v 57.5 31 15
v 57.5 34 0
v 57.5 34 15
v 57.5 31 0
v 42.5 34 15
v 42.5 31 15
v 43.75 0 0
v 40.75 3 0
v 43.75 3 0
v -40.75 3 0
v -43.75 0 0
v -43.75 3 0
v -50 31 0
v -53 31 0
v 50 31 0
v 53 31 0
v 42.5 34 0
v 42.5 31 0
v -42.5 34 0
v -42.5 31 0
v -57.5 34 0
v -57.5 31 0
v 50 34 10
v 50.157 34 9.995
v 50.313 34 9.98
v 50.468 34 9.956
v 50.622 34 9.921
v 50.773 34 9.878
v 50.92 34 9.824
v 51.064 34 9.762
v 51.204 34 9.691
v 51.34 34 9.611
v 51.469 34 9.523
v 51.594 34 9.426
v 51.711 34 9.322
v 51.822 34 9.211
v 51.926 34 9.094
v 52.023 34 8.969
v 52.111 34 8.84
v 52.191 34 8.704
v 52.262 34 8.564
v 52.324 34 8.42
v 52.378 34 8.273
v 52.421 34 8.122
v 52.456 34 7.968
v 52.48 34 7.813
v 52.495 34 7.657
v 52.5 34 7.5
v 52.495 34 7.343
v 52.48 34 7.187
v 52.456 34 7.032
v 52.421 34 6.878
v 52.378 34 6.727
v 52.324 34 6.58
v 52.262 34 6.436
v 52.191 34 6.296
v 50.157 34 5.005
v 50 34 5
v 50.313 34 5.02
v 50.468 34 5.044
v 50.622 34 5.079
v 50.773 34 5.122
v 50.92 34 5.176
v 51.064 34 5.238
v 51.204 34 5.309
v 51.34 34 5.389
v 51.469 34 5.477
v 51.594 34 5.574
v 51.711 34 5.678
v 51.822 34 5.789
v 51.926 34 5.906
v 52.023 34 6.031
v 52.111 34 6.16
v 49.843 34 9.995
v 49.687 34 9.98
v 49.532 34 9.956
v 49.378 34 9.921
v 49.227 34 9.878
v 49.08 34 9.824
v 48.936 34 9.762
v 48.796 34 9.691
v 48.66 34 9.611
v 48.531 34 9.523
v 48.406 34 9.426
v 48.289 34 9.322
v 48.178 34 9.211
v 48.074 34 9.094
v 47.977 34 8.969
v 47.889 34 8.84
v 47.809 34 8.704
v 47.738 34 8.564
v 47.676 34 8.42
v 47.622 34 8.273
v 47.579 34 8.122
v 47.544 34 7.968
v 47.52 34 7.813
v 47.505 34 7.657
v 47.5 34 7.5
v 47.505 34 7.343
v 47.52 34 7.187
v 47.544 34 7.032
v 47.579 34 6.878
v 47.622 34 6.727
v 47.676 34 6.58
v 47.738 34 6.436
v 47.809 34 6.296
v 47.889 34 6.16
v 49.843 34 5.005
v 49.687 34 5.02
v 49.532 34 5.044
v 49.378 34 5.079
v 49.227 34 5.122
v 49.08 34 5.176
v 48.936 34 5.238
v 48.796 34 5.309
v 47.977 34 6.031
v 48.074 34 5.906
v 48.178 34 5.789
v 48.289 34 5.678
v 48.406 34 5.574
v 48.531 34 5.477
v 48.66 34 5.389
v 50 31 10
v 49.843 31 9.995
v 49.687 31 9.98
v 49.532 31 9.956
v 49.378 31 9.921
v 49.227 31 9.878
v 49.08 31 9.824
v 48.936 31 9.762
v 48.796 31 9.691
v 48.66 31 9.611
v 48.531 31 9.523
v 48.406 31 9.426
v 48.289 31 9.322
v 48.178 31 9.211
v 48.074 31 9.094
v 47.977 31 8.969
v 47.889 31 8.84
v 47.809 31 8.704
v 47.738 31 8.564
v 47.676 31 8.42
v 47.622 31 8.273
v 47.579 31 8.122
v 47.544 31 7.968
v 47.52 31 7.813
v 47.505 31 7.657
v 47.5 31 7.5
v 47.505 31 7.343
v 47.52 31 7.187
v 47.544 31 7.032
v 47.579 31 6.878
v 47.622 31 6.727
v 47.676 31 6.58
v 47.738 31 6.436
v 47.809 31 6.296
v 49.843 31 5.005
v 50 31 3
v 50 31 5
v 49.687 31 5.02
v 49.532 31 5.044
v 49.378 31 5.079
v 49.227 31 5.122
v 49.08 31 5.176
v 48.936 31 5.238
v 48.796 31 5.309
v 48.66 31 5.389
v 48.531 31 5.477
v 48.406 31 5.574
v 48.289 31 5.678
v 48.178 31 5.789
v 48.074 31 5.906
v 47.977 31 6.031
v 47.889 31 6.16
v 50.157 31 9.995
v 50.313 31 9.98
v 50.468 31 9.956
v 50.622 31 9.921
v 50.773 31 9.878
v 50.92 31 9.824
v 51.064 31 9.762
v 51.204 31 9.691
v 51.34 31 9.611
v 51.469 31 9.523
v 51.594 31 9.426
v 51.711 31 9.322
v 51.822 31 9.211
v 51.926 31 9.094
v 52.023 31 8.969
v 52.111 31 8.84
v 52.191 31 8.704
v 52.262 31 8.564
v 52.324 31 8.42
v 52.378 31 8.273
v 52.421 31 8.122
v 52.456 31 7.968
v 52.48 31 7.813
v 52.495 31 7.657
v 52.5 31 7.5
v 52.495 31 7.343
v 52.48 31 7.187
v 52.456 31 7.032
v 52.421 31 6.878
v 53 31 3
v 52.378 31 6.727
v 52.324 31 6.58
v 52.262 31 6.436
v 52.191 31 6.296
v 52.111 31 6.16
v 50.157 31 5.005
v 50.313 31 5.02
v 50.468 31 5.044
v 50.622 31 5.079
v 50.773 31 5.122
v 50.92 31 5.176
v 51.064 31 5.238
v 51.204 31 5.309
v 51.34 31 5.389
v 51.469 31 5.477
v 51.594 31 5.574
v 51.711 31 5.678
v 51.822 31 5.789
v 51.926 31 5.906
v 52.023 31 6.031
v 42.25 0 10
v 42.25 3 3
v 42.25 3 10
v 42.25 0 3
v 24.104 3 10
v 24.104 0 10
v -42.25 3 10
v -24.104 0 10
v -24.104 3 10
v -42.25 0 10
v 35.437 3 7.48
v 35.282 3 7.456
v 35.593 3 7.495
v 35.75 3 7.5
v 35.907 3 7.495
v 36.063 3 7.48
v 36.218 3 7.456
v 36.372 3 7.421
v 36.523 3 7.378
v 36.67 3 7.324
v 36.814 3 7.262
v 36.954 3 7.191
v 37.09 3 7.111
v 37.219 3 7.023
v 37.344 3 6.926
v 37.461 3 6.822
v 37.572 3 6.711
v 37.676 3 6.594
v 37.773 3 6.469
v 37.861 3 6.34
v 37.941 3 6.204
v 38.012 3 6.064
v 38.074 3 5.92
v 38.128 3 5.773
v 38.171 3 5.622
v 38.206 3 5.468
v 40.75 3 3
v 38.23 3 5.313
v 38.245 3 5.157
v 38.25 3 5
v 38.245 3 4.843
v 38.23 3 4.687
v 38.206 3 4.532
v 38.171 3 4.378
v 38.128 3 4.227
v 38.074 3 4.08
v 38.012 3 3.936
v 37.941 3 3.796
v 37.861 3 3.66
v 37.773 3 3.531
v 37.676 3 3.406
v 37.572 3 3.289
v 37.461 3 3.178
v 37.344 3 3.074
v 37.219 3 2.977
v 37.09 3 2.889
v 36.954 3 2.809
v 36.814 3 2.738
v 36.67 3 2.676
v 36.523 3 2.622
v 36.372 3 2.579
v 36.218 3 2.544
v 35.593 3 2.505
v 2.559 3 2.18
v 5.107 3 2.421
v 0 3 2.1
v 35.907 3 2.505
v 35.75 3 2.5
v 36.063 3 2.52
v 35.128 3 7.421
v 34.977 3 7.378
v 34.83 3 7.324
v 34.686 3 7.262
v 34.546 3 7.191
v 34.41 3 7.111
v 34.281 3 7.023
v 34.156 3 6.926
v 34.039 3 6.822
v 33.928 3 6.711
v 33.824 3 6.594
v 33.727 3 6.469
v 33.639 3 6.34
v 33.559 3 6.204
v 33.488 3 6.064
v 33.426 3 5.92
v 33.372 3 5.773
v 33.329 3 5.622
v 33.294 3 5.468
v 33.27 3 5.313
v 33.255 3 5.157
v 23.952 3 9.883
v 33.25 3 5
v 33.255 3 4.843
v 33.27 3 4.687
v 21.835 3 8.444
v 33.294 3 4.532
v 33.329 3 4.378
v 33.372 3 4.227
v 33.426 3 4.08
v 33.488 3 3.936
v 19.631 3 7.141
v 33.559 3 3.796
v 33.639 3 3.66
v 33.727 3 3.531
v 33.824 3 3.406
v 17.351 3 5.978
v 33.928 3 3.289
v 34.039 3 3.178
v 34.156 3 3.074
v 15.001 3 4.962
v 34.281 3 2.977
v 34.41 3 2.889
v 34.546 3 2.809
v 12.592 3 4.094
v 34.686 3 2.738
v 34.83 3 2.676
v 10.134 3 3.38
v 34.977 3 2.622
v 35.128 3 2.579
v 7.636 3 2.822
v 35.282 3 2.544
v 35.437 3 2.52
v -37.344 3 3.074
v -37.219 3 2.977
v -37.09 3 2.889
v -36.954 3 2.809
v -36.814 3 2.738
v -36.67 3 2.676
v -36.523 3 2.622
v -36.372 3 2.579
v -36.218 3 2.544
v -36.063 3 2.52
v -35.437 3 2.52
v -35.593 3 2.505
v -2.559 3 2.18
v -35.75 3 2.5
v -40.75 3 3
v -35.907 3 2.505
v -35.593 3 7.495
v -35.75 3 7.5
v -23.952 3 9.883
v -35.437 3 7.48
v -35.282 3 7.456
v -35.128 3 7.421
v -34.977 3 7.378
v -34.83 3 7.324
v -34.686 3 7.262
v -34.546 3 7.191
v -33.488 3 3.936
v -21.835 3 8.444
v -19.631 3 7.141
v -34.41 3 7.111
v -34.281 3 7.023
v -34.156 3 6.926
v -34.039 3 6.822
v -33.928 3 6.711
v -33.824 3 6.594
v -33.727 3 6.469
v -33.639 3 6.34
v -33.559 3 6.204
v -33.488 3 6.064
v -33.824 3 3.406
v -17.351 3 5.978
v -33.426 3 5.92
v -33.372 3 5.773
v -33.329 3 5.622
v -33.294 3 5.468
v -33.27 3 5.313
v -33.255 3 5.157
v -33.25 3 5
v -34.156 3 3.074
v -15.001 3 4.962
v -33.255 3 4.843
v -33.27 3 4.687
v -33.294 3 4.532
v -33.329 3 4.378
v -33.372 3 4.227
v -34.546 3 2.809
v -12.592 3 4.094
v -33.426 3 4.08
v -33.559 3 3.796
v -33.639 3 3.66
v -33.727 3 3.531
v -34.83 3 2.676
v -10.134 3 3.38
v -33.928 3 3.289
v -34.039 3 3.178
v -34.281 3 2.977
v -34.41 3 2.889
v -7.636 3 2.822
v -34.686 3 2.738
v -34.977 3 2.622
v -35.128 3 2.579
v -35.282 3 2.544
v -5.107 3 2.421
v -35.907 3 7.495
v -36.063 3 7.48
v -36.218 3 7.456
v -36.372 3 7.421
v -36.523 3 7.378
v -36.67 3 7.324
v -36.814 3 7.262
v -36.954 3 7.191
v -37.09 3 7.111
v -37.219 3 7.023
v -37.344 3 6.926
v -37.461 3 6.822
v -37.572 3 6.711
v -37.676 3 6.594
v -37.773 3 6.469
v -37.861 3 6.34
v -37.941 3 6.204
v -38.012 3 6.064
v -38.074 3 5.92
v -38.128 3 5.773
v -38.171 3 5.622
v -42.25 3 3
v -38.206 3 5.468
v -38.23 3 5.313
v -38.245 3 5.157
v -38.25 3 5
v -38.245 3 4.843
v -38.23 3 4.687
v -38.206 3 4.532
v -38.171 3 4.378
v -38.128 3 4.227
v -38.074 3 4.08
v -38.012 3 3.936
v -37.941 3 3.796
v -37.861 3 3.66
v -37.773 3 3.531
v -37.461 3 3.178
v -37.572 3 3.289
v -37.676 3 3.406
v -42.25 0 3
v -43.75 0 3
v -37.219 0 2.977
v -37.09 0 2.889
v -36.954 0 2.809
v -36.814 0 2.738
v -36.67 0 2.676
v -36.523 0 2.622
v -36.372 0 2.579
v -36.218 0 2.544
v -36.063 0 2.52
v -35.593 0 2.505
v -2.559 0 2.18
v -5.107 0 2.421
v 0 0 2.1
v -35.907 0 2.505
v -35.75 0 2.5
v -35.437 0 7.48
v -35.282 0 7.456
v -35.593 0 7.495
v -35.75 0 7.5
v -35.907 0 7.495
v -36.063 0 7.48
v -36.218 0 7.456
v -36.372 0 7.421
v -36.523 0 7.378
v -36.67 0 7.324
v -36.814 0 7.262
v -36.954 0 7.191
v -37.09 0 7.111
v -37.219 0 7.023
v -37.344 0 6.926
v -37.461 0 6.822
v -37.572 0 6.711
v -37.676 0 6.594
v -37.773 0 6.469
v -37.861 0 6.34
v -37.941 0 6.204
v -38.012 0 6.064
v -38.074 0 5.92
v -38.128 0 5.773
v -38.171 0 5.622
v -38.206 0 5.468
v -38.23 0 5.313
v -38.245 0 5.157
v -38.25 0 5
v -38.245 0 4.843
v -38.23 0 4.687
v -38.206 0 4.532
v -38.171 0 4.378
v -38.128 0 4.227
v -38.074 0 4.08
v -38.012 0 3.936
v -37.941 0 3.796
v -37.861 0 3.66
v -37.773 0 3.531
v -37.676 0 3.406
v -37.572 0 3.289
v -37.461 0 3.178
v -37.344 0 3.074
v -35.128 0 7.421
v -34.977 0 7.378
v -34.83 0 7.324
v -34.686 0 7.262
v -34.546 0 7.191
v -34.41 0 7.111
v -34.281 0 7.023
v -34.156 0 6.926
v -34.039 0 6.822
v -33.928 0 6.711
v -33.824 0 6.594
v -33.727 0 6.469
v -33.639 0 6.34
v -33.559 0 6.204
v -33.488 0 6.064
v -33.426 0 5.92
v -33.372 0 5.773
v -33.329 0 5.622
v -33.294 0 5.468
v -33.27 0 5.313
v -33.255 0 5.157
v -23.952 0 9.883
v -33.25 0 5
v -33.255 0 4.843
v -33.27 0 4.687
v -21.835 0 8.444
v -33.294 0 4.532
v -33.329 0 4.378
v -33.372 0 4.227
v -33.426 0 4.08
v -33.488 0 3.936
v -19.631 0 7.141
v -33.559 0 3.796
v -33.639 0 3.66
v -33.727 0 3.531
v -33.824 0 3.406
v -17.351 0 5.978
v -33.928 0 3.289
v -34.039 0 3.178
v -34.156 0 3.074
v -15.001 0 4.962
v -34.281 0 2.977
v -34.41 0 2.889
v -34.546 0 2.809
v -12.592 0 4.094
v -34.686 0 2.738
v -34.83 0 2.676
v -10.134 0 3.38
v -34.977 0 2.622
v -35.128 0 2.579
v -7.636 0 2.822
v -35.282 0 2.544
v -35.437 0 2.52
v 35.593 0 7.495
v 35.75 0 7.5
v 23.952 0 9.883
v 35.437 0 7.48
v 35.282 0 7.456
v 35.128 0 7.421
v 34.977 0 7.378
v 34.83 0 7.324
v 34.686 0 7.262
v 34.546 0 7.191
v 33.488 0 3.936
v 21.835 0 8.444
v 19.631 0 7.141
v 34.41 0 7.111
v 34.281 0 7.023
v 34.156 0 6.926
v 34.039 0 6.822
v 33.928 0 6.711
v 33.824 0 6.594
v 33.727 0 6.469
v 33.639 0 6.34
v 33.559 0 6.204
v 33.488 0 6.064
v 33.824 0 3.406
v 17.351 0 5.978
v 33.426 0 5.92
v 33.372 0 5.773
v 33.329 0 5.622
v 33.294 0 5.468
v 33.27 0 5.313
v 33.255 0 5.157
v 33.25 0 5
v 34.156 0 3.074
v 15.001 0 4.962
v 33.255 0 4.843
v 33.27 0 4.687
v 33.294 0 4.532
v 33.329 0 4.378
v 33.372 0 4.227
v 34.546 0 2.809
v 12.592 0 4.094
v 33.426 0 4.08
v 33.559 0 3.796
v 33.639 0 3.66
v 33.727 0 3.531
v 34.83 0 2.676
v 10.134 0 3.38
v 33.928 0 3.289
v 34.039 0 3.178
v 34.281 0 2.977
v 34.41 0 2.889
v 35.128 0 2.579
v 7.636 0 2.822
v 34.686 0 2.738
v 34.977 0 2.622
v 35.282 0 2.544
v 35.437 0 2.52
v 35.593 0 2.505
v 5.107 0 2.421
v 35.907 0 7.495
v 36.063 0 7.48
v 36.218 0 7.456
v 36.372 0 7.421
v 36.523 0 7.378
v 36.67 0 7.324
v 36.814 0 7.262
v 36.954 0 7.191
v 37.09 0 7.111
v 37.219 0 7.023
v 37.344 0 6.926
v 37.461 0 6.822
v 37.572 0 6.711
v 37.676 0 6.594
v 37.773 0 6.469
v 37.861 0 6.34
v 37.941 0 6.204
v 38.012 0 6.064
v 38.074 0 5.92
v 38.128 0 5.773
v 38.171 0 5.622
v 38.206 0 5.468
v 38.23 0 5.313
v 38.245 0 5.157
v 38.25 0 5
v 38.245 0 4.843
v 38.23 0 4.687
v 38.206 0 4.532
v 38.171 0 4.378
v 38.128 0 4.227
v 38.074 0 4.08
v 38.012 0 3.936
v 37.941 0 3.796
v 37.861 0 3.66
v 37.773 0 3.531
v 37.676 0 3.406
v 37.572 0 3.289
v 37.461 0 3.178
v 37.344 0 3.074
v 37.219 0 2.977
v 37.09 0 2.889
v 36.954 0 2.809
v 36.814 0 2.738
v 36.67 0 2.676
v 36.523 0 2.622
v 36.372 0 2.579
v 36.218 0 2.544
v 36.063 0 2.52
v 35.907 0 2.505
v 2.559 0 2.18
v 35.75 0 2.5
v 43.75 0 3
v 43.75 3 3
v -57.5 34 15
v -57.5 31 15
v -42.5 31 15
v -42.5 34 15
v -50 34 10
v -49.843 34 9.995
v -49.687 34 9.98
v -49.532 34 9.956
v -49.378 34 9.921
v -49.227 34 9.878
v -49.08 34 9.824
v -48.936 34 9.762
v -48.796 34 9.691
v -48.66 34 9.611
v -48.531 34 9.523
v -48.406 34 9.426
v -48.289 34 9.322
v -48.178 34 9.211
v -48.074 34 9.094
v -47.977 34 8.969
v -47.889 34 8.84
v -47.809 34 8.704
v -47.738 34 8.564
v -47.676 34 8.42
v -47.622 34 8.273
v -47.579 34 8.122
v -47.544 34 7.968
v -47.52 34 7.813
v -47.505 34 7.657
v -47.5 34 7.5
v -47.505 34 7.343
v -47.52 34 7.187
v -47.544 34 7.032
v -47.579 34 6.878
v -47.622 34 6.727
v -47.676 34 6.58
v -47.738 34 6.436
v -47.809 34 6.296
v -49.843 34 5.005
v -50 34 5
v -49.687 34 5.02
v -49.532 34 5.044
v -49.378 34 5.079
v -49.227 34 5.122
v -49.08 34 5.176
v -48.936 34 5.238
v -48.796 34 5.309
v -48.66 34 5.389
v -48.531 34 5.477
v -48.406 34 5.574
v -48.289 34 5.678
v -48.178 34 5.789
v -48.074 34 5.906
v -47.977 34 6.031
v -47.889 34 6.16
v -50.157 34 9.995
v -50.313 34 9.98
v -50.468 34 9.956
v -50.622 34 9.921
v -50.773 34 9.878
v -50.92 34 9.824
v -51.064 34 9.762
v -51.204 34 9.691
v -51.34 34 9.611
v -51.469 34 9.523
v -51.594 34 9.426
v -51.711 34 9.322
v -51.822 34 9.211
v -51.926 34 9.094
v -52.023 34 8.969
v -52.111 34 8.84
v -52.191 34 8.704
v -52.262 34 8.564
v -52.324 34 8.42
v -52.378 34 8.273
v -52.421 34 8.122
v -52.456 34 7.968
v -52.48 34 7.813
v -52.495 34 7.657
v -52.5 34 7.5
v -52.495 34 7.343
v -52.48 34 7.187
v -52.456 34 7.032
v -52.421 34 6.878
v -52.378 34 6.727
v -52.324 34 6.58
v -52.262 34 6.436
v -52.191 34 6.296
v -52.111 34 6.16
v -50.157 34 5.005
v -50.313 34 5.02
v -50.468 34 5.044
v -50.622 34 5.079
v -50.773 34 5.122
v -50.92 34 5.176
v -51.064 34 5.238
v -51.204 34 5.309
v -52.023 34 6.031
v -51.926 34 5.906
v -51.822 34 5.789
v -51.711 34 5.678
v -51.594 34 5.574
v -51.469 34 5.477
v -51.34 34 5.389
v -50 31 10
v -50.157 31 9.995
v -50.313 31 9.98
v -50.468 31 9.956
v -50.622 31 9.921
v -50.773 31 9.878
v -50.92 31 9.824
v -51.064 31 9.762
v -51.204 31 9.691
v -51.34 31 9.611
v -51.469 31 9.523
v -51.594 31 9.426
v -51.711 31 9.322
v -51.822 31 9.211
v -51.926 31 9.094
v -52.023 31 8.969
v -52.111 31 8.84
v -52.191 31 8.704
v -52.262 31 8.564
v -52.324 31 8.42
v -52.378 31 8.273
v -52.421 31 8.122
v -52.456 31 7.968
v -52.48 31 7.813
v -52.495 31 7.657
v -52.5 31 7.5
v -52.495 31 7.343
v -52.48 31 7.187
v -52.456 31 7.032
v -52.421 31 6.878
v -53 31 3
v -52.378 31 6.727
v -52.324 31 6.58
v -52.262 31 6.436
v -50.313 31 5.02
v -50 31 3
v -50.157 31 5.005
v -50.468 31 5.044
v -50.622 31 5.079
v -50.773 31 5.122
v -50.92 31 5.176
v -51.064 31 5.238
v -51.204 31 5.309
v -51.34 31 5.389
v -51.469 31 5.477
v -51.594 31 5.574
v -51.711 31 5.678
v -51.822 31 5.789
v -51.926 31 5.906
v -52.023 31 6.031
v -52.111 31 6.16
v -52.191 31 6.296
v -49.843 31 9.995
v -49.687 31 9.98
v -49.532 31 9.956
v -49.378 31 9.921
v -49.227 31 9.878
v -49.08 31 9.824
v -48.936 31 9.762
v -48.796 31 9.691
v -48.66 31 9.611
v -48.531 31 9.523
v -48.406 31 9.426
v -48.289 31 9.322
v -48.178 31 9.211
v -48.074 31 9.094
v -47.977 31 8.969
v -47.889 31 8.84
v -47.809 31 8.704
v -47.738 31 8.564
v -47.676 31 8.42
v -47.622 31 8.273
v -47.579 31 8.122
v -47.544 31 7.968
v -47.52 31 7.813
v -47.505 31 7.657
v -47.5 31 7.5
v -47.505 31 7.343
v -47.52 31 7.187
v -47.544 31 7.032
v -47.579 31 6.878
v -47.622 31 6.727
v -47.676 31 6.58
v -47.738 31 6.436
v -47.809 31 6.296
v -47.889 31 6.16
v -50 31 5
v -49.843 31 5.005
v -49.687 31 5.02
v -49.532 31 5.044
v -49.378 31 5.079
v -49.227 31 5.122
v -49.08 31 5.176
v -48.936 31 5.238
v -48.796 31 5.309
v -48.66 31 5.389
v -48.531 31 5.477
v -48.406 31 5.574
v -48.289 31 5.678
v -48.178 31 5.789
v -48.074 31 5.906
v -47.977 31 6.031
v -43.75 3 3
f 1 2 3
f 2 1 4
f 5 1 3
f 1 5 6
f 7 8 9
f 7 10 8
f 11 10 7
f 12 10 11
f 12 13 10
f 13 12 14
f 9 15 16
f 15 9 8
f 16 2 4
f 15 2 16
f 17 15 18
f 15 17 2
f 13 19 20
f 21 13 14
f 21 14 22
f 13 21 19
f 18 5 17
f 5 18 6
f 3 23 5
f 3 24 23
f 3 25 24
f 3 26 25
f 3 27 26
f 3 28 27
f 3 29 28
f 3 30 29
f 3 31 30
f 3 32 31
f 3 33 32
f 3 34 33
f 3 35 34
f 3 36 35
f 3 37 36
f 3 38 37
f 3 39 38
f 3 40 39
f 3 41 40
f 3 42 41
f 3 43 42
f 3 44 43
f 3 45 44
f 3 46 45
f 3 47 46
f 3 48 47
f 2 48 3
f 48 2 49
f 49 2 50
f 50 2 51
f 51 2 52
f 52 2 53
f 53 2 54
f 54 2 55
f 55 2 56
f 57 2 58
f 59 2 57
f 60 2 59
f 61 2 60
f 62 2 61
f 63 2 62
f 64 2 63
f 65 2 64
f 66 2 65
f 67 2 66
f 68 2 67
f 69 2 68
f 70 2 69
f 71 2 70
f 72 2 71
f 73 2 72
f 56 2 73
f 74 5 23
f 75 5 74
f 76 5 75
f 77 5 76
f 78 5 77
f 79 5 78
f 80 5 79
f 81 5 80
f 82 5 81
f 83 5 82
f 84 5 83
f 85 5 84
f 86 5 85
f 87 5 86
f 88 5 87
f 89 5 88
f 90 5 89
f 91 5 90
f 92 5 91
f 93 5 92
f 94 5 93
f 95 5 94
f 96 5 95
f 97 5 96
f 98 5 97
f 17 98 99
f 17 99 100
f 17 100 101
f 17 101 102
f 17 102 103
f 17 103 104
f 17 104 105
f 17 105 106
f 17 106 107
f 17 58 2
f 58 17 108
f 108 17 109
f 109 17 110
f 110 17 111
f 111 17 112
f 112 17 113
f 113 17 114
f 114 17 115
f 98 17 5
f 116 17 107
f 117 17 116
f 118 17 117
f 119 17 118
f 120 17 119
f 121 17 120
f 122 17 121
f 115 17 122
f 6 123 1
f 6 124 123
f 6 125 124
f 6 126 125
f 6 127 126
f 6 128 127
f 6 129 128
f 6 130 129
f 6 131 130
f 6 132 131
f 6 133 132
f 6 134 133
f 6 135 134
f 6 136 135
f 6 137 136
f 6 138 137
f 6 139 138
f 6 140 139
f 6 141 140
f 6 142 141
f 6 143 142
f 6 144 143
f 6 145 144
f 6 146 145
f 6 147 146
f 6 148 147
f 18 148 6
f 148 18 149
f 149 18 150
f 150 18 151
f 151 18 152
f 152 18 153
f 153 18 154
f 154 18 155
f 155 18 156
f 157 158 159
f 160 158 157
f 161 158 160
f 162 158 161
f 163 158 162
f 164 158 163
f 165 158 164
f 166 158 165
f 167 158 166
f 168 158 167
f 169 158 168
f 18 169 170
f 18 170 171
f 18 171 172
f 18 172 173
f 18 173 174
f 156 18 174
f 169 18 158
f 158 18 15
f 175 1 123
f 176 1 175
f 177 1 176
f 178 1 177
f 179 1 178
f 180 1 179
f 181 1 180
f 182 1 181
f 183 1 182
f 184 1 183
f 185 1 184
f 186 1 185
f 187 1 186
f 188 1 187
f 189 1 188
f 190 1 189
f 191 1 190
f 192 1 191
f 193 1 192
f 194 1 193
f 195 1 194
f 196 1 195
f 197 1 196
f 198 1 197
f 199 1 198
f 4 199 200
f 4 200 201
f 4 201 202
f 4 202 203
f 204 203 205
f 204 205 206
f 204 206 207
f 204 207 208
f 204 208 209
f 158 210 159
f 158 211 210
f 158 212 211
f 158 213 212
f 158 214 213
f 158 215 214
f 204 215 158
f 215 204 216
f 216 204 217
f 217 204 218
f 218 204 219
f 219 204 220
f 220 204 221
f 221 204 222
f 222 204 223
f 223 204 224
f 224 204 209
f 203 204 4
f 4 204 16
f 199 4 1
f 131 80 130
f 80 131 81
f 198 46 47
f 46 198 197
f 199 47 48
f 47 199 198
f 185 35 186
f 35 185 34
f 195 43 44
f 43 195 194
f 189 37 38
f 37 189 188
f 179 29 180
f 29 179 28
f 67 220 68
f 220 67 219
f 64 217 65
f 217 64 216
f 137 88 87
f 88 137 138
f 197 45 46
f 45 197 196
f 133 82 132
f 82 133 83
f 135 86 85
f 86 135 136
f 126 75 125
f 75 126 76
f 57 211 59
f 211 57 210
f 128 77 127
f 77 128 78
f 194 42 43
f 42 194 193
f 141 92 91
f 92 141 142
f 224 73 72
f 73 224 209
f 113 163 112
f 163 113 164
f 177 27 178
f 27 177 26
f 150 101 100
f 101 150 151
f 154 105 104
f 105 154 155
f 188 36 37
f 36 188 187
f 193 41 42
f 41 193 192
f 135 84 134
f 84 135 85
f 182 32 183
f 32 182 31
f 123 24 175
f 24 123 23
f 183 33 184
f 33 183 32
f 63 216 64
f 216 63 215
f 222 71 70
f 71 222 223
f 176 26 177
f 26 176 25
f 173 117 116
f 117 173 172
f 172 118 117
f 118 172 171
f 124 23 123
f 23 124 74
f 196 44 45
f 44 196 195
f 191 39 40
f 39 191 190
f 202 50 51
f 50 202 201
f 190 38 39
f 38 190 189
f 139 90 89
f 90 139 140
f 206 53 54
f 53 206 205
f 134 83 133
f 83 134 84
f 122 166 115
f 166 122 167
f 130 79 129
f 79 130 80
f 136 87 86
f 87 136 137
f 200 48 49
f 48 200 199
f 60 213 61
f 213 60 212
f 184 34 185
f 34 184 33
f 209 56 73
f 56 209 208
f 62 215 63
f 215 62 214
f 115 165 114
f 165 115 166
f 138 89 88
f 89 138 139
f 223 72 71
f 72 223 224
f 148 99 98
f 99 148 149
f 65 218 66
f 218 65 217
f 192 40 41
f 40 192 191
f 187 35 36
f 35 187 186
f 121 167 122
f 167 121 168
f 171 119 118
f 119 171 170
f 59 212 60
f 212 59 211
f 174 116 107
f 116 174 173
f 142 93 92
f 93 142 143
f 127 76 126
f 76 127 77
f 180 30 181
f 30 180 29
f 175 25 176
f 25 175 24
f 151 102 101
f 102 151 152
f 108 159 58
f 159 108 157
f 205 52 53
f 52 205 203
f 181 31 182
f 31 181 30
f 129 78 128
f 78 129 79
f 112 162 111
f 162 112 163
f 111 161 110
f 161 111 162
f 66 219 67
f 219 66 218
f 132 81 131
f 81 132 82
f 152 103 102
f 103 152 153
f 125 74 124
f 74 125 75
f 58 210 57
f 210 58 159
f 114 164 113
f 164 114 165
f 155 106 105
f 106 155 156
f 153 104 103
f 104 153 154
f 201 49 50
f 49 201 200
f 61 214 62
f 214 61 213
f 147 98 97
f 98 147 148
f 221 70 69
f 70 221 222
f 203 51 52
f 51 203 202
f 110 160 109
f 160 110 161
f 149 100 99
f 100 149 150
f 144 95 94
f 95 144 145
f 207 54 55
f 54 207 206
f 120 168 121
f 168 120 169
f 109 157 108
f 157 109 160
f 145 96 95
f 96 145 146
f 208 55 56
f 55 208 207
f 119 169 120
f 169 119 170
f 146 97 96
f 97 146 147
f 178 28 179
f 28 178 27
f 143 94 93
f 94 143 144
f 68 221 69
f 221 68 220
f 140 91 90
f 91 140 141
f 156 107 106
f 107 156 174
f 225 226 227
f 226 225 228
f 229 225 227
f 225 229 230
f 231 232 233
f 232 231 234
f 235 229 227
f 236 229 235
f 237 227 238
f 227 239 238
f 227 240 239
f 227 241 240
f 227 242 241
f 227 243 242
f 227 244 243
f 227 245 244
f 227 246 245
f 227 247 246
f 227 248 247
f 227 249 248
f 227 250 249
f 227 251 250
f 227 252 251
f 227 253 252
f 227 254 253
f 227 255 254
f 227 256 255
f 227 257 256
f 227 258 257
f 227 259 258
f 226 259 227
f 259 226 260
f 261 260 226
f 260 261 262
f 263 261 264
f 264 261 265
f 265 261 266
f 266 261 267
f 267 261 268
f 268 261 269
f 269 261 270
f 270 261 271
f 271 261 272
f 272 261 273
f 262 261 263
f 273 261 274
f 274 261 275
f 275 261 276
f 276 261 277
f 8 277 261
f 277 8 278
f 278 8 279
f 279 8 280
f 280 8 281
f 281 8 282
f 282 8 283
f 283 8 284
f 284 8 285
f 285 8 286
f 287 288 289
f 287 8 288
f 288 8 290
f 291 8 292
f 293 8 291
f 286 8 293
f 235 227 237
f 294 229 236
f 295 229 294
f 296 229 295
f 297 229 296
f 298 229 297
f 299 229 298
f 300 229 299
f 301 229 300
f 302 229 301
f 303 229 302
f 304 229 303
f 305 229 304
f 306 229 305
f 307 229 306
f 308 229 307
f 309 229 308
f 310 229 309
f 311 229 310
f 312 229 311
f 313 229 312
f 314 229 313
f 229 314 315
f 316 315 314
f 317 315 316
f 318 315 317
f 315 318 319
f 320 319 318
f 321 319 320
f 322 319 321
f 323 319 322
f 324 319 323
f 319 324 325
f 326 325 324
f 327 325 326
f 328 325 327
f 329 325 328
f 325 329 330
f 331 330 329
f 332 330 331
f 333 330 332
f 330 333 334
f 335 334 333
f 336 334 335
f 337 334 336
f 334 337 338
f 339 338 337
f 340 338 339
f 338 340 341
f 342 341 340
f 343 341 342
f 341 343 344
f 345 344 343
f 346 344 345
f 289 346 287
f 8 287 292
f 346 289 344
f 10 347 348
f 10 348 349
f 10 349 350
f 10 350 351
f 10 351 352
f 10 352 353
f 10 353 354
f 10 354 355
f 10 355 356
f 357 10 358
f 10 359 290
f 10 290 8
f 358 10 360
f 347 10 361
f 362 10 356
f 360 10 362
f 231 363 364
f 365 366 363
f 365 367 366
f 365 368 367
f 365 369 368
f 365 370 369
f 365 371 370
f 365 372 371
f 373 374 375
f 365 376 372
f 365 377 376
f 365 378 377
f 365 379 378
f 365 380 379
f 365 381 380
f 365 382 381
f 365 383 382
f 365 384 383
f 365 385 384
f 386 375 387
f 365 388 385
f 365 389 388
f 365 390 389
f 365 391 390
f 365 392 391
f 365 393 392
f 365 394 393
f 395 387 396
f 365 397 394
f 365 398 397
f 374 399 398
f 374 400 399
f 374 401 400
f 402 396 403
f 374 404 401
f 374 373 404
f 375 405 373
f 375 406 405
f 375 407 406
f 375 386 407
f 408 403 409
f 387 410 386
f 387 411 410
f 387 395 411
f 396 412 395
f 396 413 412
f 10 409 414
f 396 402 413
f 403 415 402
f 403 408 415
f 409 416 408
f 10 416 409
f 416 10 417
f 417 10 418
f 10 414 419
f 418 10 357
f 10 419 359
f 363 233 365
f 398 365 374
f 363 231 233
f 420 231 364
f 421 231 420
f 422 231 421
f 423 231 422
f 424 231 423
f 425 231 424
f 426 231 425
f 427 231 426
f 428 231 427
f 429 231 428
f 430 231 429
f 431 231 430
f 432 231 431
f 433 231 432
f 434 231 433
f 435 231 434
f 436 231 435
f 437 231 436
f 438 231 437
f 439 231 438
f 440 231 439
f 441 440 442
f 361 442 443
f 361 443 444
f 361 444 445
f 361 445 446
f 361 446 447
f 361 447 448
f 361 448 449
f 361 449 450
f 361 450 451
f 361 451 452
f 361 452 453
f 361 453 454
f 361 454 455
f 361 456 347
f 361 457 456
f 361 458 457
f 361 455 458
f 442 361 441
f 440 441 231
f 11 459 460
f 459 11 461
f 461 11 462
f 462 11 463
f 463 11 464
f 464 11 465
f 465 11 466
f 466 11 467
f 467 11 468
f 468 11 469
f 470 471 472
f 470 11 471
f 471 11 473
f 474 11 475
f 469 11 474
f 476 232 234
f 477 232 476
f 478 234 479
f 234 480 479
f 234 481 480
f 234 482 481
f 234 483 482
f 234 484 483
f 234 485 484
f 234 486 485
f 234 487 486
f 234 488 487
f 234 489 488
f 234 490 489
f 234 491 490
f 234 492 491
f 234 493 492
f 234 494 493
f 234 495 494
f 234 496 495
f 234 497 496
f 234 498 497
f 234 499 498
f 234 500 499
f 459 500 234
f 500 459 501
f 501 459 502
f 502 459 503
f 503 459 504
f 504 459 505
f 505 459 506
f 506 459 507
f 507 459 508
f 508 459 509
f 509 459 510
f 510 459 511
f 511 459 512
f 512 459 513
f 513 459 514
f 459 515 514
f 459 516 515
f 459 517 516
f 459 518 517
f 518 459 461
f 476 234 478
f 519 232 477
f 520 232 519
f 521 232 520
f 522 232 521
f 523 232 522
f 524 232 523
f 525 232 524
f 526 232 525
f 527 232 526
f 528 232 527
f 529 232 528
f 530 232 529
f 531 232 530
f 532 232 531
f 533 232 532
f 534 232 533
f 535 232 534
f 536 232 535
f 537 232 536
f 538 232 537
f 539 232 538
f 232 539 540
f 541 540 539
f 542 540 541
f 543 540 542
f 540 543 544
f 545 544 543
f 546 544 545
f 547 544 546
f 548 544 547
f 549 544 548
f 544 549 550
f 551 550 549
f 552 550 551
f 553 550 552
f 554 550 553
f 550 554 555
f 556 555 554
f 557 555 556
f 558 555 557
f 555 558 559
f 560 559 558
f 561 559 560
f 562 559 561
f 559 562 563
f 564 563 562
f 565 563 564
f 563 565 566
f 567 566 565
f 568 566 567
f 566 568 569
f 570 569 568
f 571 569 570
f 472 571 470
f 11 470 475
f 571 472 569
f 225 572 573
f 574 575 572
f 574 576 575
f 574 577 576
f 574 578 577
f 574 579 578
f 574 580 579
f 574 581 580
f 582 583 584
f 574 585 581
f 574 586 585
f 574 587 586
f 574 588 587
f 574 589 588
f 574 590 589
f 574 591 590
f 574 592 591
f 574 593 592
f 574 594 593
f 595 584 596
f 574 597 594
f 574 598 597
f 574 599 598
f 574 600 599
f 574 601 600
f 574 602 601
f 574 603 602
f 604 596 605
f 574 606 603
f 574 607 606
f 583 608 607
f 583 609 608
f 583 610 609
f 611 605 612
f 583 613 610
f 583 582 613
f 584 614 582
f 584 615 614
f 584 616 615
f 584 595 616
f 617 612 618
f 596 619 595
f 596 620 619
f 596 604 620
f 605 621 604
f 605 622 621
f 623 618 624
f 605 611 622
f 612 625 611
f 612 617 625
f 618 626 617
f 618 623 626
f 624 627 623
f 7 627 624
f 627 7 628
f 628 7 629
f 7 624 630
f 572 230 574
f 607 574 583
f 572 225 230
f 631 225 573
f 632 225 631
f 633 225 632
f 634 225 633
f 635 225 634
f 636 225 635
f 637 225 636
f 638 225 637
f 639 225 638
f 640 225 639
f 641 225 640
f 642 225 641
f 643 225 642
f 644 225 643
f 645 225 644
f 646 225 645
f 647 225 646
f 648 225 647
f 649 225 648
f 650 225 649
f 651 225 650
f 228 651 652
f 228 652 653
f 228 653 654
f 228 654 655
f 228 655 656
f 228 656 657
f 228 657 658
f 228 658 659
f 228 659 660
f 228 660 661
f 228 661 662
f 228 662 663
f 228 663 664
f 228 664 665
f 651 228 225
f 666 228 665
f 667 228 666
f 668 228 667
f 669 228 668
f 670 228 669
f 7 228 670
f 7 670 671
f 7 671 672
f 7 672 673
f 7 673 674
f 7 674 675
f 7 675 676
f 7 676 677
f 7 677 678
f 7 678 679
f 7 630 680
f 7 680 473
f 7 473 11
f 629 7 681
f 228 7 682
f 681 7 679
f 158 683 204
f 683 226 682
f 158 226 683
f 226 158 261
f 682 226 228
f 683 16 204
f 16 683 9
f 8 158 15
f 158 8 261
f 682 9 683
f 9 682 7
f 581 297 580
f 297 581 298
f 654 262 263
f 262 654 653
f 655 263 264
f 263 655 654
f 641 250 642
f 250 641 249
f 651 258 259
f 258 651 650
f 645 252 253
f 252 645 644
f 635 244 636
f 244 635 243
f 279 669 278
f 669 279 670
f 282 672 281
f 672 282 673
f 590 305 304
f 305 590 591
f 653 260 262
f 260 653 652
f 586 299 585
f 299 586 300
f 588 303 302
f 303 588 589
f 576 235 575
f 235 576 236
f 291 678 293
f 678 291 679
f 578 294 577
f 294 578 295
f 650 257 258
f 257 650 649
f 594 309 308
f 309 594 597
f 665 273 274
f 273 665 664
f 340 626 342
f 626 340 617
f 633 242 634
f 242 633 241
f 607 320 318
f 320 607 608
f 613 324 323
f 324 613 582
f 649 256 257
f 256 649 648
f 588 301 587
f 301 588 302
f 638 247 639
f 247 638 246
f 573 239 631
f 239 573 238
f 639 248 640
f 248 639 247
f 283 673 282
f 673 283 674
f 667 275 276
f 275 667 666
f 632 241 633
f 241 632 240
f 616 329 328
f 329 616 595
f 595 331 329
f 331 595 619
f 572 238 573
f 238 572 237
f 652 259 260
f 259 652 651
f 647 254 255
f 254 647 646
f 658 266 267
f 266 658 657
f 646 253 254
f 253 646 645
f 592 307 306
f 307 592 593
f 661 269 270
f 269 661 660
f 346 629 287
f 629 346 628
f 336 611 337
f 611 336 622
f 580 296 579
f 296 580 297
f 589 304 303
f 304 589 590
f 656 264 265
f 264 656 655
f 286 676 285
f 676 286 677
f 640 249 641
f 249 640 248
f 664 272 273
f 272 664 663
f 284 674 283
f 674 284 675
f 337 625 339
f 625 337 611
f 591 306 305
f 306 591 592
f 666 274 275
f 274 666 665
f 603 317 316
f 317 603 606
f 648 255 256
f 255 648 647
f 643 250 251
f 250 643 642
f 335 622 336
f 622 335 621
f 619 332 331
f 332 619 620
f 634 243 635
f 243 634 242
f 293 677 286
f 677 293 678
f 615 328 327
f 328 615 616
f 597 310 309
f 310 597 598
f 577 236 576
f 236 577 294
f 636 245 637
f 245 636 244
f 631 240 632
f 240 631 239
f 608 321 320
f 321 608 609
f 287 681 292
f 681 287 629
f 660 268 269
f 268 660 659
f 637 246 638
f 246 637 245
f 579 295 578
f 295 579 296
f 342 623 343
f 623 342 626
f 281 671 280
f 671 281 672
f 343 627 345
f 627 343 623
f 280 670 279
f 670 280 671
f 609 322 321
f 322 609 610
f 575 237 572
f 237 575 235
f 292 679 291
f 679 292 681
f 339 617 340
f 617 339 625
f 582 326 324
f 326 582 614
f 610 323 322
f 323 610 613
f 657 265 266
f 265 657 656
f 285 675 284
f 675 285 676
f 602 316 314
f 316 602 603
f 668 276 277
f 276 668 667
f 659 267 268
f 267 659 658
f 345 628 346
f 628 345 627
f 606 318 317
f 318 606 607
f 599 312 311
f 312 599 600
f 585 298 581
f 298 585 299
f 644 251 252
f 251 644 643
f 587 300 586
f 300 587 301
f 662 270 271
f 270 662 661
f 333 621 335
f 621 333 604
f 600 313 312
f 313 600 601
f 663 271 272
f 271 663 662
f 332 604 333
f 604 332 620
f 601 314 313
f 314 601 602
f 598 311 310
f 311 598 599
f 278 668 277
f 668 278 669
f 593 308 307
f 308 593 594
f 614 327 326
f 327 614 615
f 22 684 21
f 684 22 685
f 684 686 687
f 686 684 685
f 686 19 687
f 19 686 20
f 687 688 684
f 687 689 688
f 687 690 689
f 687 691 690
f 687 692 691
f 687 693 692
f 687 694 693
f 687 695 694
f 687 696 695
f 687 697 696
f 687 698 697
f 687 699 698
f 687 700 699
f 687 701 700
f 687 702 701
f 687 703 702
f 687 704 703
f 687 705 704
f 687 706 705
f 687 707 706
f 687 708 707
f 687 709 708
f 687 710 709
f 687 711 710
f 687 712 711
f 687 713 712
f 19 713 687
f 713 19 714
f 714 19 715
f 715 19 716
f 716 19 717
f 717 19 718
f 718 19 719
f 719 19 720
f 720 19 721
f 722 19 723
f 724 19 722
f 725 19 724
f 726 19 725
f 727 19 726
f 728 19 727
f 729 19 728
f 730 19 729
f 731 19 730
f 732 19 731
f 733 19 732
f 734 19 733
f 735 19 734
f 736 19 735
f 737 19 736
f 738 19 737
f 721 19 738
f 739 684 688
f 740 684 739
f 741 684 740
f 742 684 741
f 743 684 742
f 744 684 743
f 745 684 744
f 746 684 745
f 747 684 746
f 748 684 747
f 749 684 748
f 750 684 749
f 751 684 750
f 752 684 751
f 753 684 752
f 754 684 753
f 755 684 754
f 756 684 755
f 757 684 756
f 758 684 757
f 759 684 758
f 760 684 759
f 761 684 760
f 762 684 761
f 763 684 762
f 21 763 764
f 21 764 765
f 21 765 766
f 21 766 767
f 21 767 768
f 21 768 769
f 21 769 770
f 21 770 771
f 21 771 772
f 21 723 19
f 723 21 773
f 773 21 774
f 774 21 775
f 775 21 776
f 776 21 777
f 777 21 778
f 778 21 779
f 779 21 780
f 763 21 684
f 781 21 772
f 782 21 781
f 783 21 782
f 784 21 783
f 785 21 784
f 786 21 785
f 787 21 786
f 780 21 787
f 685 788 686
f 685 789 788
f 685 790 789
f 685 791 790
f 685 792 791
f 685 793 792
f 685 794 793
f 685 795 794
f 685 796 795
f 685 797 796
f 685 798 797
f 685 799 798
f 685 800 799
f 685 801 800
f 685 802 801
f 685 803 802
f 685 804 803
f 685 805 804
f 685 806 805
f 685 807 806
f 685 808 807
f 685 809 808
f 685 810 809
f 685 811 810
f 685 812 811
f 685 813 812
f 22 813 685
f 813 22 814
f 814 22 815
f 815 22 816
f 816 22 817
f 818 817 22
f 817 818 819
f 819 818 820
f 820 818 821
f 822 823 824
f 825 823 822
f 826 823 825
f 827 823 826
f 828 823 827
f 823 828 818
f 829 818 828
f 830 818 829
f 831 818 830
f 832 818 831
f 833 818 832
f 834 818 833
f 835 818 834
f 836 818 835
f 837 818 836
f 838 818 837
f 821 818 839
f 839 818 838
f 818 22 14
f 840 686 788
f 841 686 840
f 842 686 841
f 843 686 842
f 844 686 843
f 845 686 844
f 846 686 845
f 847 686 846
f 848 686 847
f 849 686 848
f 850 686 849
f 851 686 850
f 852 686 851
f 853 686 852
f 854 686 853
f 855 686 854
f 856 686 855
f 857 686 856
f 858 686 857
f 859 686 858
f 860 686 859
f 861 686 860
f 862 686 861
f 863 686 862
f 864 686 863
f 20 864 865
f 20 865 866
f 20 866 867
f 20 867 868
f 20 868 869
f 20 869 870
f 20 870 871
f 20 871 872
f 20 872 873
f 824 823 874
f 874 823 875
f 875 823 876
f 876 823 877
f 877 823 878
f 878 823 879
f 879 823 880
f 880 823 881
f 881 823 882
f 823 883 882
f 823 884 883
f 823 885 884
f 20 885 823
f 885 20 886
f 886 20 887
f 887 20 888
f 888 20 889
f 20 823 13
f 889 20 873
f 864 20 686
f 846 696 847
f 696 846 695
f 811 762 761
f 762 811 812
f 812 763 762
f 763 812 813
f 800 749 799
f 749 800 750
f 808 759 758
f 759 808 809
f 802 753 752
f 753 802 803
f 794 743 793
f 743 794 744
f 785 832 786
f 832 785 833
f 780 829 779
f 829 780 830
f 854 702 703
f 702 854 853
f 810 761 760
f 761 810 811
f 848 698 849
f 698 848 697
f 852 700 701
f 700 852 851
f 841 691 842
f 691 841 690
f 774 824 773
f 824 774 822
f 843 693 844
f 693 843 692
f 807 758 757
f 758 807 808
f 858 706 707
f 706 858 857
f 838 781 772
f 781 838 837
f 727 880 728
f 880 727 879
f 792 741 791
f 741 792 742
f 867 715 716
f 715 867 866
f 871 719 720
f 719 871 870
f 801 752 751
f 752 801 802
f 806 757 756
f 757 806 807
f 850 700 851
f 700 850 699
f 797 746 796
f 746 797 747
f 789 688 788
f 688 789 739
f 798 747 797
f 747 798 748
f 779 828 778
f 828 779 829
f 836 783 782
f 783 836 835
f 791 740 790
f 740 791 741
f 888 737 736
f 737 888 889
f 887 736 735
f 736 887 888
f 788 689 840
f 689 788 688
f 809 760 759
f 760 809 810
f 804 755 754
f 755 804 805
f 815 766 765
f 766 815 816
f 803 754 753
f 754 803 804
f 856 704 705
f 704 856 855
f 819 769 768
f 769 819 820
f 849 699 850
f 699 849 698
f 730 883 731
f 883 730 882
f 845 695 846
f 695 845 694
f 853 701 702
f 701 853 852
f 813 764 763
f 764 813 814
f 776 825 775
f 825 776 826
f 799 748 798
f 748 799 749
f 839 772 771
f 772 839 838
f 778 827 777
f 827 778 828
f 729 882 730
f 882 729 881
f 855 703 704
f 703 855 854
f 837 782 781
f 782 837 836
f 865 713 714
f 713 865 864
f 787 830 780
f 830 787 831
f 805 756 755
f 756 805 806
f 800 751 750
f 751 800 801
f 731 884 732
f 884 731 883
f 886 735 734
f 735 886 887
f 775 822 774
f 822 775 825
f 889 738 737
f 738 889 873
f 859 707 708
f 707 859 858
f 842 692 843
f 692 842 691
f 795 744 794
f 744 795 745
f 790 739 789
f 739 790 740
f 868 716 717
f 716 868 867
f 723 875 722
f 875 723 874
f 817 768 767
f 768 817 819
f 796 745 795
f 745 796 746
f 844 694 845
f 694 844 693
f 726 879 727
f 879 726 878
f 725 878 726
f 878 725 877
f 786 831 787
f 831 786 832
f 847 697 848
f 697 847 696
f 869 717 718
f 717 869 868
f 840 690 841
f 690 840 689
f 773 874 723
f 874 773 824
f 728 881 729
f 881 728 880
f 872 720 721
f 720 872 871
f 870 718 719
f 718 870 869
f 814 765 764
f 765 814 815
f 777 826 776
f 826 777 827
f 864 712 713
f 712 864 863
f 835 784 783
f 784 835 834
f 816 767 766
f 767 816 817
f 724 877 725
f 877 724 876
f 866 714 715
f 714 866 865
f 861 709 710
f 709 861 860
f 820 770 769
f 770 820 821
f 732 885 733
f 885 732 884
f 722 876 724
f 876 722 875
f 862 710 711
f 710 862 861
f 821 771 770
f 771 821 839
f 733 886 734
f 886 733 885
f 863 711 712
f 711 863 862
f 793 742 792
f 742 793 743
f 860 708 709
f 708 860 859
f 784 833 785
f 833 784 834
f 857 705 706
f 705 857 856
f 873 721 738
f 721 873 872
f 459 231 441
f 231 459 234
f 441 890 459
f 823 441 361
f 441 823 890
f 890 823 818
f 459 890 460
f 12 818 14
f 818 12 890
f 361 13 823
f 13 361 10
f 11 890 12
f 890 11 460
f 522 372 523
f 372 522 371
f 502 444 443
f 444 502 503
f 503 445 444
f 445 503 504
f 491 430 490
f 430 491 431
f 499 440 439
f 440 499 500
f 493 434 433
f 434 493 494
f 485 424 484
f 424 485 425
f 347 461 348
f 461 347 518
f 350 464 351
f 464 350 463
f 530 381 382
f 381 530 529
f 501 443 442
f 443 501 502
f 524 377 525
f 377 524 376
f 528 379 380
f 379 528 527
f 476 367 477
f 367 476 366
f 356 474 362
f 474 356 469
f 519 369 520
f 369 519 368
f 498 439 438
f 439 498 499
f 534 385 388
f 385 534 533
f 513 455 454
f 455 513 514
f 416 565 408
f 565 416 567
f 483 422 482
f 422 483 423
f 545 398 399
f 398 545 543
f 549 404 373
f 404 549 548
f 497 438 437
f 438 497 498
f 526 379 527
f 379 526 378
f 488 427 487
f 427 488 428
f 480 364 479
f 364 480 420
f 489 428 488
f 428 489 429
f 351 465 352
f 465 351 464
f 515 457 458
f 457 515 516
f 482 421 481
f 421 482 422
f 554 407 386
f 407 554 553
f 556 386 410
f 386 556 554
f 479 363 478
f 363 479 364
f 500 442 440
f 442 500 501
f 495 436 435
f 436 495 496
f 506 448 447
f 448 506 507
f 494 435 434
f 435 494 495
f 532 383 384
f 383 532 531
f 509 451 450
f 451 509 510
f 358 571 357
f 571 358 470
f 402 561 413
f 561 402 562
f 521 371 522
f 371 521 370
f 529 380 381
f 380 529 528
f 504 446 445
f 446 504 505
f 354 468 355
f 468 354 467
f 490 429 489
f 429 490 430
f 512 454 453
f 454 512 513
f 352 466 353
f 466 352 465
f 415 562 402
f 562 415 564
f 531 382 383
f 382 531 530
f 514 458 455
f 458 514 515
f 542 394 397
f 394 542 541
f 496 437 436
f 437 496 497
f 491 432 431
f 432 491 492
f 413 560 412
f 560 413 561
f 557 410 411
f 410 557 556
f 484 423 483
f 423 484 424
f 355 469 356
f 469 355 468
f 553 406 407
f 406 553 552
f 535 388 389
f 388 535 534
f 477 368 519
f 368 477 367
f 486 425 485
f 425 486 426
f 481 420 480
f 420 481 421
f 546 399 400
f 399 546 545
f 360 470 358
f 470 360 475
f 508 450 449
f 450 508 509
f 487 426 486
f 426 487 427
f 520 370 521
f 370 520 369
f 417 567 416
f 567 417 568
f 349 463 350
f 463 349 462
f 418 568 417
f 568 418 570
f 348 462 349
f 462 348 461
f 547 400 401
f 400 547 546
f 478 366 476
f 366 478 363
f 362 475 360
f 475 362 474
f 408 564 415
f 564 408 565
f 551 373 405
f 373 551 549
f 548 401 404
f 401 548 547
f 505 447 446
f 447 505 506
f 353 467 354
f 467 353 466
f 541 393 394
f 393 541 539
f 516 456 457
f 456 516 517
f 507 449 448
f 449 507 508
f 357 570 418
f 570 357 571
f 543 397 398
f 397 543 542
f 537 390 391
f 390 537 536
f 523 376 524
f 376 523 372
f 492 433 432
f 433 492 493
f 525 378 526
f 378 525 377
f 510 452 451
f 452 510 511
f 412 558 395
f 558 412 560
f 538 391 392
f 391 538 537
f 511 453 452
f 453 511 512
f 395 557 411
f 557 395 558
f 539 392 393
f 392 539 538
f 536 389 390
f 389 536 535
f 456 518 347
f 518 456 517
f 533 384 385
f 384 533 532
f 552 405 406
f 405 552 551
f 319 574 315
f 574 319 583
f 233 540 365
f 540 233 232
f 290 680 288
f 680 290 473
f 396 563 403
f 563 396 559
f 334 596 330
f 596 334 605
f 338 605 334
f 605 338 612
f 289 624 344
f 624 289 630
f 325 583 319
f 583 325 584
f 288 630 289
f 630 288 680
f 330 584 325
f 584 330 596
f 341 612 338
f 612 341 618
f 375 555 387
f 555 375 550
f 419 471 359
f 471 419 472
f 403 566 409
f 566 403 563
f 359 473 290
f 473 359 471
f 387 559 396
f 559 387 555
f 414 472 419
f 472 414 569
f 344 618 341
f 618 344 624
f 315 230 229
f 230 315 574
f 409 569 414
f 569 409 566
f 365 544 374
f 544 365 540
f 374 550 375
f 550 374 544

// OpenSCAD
// Thickness of part surfaces.
thickness = 3;
// Distance in mm that fan will be raised by. Any distance in mm greater than 2 x thickness.
height = 34;
// Center-to-center distance in mm between fan mounting holes, used for sizing the fan mount plate. i.e. an 80mm fan should be set to 71.5mm
fan_mounting_hole_seperation = 71.5;
// Center-to-center distance in mm between chassis mounting holes, used for positioning the mounting feet.
mount_hole_seperation = 100;
// Chassis mount screw hole diameter in mm.
mount_screw_hole_diameter = 5;
// Fan mount screw hole diameter in mm.
fan_screw_hole_diameter = 5;

module fan_stand(thickness, height, fan_hole_sep, mount_hole_sep)
{
	// Calculate sizes of parts (some calculations are done below).
	fan_dia = fan_mounting_hole_seperation + 2*fan_screw_hole_diameter;
	strut_tilt = (mount_hole_sep - fan_dia) / 2;
	// These two are overridden below because OpenSCAD can't assign
	// values inside conditionals.
	mount_width = 2 * fan_screw_hole_diameter;
	foot_width = 3 * thickness;

	// Mounting strut
	module mounting_strut() {
		tilt = strut_tilt;
		x1 = fan_dia/2;           //   p5 -- p4
		x2 = x1+thickness;        //  /     /
		x3 = x1+tilt+thickness;   // p6    p3
		x4 = x1+tilt;             // |     |
		z = height - thickness;   // p1 -- p2

		linear_extrude(height=thickness) {
			// Trapazoidal polygon.
			polygon(points=[[x1, 0], [x2, 0], [x2, thickness],
							[x3, z], [x4, z], [x1, thickness]]);
		}
	}

	module foot(size) {
		// Mounting foot
		footX = size;
		footY = thickness;
		footZ = footX;
		x = fan_dia/2 + strut_tilt - size/2;
	
		difference() {
			translate([x, height - thickness, 0])
				cube([footX, footY, footZ]);

			// Cut chassis mount screw hole
			translate([mount_hole_sep/2, height +1, size/2]) 
			rotate([90,0,0])
				cylinder(h=thickness+2, r=mount_screw_hole_diameter/2, center = false, $fn=100);
		}
	}

	module half_of_mount() {
		difference() {	
			// Create half
			union() {
				// Fan mount (conditional accounts for small screw hole).
				if (mount_width < thickness) {
					cube([fan_dia/2+thickness/2,thickness,thickness*3]);
				} else {
					cube([fan_dia/2+thickness/2,thickness,mount_width]);
				}

				// The strut.
				mounting_strut();
	
				// Mounting feet  (conditional accounts for small screw hole).
				if (mount_screw_hole_diameter < thickness) {
					foot(thickness * 3);
				} else {
					foot(mount_screw_hole_diameter * 3);
				}
			}
			// Cut fan mount screw hole
			translate([fan_hole_sep/2, thickness+1, mount_width/2]) 
			rotate([90,0,0])
			cylinder(h=thickness+2, r=fan_screw_hole_diameter/2, center = false, $fn=100);
		}
	}

	// Create and join both halves.
	module complete_mount() {
		union() {
			// First half
			half_of_mount();

			// Second half
			mirror([1, 0, 0])
			half_of_mount();
		}
	}

	// Create mount and cut out the air hole.
	difference() {
		complete_mount();

		// Air cutout
		translate([0, thickness*1.5, fan_dia/2 + thickness*0.7]) rotate([90,0,0])
		cylinder(h=thickness*3, r=fan_dia/2, center = false, $fn=100);
	}
}

fan_stand(thickness, height, fan_mounting_hole_seperation, mount_hole_seperation);
